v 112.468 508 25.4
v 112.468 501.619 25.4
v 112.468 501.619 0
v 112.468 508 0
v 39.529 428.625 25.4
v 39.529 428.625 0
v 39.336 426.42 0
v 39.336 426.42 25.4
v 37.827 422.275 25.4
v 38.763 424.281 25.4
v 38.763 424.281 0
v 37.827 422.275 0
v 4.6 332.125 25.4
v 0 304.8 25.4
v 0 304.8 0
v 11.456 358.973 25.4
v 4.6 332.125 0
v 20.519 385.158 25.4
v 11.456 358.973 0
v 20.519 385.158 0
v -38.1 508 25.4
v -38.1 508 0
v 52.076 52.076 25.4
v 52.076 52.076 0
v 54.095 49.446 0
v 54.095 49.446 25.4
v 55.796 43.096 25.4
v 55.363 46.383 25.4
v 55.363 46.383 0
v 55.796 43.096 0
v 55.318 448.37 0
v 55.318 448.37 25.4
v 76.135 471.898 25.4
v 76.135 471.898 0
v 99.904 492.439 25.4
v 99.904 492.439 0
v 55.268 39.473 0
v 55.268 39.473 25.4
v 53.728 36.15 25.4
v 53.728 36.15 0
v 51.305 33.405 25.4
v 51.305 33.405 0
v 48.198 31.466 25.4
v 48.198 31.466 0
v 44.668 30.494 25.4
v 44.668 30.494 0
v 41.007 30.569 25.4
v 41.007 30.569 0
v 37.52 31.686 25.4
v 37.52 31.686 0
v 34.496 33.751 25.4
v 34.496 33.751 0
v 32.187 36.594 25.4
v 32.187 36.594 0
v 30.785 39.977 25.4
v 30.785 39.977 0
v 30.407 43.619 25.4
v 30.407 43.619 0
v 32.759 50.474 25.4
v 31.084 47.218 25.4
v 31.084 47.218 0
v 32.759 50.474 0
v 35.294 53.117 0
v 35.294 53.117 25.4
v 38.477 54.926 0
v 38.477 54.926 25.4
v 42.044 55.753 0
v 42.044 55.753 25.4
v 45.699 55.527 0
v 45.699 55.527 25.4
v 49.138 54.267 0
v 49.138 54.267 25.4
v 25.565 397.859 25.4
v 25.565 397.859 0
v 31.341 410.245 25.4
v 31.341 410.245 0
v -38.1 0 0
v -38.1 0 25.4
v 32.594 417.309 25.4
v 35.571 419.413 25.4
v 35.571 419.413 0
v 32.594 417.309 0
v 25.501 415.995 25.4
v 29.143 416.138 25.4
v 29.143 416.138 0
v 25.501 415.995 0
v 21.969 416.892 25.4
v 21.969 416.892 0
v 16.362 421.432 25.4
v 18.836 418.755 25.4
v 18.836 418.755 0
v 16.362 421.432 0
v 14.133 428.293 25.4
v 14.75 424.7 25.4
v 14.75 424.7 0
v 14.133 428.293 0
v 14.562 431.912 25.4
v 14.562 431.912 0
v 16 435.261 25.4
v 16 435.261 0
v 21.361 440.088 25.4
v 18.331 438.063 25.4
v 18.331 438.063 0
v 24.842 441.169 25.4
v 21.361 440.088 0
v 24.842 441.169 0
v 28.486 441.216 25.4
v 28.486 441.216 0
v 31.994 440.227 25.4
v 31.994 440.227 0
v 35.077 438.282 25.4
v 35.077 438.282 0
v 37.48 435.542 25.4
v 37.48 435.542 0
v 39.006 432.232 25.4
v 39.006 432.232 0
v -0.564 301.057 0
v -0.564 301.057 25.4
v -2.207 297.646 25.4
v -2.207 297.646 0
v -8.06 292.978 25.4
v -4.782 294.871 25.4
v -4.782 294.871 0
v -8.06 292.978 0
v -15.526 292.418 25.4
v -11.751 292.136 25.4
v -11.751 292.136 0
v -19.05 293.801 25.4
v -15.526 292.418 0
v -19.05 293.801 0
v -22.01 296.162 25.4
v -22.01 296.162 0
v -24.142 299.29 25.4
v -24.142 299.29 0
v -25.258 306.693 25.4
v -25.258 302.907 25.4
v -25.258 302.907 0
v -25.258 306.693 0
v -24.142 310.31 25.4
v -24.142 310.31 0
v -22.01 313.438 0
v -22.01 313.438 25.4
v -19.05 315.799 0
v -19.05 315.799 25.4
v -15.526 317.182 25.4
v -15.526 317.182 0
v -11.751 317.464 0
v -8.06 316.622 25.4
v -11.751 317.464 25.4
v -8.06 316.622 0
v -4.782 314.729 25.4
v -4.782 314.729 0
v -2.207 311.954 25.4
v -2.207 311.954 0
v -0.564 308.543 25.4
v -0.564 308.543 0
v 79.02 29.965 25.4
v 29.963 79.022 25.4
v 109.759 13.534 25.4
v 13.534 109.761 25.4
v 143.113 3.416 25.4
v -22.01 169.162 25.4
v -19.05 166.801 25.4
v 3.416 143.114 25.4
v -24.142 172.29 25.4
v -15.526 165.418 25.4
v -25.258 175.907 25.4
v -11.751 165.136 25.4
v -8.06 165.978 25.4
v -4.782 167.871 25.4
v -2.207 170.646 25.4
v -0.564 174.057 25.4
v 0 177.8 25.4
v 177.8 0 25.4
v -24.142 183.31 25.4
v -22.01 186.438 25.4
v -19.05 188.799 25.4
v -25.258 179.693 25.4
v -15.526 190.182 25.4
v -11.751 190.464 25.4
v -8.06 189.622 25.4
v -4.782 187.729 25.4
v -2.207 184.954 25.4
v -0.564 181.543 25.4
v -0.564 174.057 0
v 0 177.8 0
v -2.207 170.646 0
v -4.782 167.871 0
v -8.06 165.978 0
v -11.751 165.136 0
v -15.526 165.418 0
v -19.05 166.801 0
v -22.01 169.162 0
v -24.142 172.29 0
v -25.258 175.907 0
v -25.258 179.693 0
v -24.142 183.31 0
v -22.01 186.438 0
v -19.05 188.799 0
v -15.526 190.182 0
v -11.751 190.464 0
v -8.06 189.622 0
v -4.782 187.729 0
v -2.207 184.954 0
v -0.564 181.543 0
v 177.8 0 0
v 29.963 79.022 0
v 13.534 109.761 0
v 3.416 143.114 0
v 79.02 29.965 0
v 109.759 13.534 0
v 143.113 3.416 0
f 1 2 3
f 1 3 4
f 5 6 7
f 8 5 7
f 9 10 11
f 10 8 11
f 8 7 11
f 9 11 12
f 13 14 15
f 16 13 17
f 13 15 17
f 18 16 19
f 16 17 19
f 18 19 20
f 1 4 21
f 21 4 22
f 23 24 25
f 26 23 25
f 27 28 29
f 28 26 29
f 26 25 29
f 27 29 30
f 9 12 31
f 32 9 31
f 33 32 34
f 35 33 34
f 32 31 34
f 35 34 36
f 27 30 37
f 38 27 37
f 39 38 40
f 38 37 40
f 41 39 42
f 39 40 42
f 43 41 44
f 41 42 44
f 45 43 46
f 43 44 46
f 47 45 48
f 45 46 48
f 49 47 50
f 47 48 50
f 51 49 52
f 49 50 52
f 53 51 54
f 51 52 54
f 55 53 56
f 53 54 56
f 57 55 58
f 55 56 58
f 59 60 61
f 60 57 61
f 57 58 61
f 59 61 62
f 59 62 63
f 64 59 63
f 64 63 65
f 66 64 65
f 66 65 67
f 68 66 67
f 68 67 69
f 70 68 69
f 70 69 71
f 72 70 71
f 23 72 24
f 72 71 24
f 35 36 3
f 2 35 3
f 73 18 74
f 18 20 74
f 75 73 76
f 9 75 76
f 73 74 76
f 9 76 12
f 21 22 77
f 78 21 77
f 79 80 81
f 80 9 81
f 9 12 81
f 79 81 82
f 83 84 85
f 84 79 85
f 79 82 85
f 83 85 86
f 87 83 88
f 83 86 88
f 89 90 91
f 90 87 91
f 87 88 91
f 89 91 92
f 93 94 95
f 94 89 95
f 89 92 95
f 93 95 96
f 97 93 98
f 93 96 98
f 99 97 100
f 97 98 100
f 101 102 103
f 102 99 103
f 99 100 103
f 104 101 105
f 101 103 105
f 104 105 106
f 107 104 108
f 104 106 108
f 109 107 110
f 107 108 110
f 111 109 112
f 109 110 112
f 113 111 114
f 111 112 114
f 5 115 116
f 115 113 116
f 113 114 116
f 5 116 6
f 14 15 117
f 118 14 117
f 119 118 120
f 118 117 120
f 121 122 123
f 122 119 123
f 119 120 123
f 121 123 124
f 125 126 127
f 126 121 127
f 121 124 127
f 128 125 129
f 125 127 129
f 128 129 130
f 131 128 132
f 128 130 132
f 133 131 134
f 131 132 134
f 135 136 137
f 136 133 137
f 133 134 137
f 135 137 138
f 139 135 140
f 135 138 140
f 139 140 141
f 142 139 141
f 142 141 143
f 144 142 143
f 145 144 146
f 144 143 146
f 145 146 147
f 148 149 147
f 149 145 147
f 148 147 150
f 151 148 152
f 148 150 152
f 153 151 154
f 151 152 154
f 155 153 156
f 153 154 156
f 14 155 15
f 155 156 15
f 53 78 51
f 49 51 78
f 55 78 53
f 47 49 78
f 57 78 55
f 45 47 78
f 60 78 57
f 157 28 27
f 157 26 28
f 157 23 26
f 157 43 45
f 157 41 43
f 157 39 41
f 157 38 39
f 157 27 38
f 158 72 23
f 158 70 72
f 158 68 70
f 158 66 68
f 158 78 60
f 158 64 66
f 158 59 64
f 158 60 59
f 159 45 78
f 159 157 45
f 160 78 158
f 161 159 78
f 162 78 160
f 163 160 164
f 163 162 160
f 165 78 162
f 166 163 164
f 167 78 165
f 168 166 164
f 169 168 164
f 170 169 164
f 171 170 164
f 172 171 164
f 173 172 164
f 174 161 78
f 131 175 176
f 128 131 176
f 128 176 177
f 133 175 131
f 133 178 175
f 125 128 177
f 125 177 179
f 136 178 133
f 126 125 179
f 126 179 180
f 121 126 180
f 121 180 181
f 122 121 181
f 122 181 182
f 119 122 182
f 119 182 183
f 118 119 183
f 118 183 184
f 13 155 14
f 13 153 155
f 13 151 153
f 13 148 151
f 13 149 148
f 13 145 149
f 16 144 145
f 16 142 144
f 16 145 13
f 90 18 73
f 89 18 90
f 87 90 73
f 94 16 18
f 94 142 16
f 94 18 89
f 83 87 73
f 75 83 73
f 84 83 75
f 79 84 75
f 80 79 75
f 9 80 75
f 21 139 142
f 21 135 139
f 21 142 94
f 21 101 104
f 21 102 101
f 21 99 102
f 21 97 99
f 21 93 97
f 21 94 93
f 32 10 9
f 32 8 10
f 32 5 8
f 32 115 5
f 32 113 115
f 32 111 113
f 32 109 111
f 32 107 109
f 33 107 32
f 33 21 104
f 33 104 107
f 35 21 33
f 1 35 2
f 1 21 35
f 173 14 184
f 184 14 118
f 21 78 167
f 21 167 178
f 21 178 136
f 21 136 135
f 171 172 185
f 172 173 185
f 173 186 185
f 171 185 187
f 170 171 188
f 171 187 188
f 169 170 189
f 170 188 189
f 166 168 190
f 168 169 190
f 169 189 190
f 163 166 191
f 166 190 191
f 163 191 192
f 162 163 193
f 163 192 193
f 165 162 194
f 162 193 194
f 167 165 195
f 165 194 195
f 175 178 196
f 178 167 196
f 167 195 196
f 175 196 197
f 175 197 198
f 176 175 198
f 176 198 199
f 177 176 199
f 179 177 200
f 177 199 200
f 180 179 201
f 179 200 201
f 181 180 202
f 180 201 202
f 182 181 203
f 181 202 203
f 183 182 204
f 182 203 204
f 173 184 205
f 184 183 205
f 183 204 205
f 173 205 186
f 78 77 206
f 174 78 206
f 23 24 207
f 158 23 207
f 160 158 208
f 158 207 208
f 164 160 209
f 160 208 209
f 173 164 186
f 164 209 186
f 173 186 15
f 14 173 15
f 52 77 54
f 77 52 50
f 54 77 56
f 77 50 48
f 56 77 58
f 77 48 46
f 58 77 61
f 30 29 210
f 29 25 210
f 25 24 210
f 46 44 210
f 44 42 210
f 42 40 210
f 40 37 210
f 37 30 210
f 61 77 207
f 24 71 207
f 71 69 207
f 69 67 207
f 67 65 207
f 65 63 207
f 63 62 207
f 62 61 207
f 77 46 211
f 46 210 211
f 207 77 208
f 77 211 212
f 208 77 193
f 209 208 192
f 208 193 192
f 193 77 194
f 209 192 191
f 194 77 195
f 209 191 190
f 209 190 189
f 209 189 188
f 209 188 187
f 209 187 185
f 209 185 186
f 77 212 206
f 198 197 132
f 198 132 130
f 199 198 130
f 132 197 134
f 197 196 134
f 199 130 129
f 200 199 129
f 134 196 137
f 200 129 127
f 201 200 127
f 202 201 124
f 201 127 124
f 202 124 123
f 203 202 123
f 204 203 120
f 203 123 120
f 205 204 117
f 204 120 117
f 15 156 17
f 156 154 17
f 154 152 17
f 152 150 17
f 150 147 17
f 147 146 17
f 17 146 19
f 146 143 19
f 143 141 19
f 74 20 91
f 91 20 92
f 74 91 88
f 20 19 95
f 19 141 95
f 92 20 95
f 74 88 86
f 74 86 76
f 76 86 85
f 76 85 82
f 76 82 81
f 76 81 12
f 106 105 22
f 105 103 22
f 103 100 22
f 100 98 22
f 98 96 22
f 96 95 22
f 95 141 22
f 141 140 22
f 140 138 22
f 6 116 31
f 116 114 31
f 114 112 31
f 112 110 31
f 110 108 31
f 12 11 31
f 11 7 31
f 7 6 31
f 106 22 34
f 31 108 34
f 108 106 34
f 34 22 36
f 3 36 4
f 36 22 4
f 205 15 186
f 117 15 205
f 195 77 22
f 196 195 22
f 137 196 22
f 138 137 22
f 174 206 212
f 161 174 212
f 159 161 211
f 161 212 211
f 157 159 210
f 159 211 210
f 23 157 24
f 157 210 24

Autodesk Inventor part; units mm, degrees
ref_plane "YZ Plane" through (0, 0, 0) normal (1, 0, 0) x (0, 1, 0)
ref_plane "XZ Plane" through (0, 0, 0) normal (0, 1, 0) x (-1, 0, 0)
ref_plane "XY Plane" through (0, 0, 0) normal (0, 0, 1) x (1, 0, 0)
sketch "Sketch1" plane through (0, 0, 0) normal (0, 0, 1) x (1, 0, 0)
  line L0 (0, 0) -> (609.6, 0) construction
  line L1 (609.6, 0) -> (609.6, 209.55)
  line L2 (609.6, 209.55) -> (0, 209.55) construction
  line L3 (0, 209.55) -> (0, 0) construction
  line L4 (0, 0) -> (304.8, 0) construction
  line L5 (304.8, 0) -> (304.8, 165.1) construction
  line L6 (304.8, 165.1) -> (0, 165.1) construction
  line L7 (0, 165.1) -> (0, 0) construction
  line L8 (0, 0) -> (165.1, 0) construction
  line L9 (165.1, 0) -> (165.1, 304.8) construction
  line L10 (165.1, 304.8) -> (0, 304.8) construction
  line L11 (0, 304.8) -> (0, 0) construction
  line L12 (0, 0) -> (177.8, 0) construction
  line L13 (177.8, 0) -> (177.8, 177.8) construction
  line L14 (177.8, 177.8) -> (0, 177.8) construction
  line L15 (0, 177.8) -> (0, 0) construction
  circle A0 centre (177.8, 177.8) radius 12.7
  line L16 (177.8, 177.8) -> (165.1, 177.8)
  line L17 (177.8, 177.8) -> (177.8, 165.1)
  line L18 (177.8, 177.8) -> (168.819744, 168.819744)
  line L19 (177.8, 177.8) -> (190.5, 177.8) construction
  line L20 (168.819744, 168.819744) -> (52.076414, 52.076414) construction
  line L21 (168.819744, 168.819744) -> (333.919744, 168.819744) construction
  line L22 (177.8, 165.1) -> (177.8, 0) construction
  line L23 (165.1, 177.8) -> (0, 177.8) construction
  arc A1 (0, 177.8) -> (177.8, 0) centre (177.8, 177.8) ccw
  line L24 (177.8, 177.8) -> (355.6, 177.8) construction
  line L25 (355.6, 177.8) -> (355.6, 193.675)
  line L26 (355.6, 193.675) -> (177.8, 193.675) construction
  line L27 (177.8, 193.675) -> (177.8, 177.8) construction
  circle A2 centre (355.6, 193.675) radius 12.7
  line L28 (355.6, 193.675) -> (482.6, 193.675) construction
  line L29 (482.6, 193.675) -> (482.6, 209.55) construction
  line L30 (482.6, 209.55) -> (355.6, 209.55) construction
  line L31 (355.6, 209.55) -> (355.6, 193.675) construction
  circle A3 centre (482.6, 209.55) radius 12.7
  line L32 (177.8, 0) -> (609.6, 0)
  line L33 (177.8, 165.1) -> (355.6, 180.975)
  line L34 (482.6, 196.85) -> (355.6, 180.975)
  line L35 (482.6, 196.85) -> (609.6, 209.55)
  line L36 (165.1, 177.8) -> (165.1, 304.8) construction
  line L37 (165.1, 304.8) -> (241.3, 304.8) construction
  circle A4 centre (241.3, 304.8) radius 76.2
  circle A5 centre (177.8, 228.6) radius 12.7
  line L38 (177.8, 177.8) -> (177.8, 228.6)
  line L39 (0, 177.8) -> (0, 304.8)
  line L40 (241.3, 304.8) -> (195.441695, 365.656026) construction
  line L41 (241.3, 304.8) -> (317.5, 304.8) construction
  line L42 (195.441695, 365.656026) -> (354.191695, 365.656026) construction
  line L43 (195.441695, 365.656026) -> (99.90356, 492.439413) construction
  line L44 (195.441695, 365.656026) -> (354.191695, 365.656026) construction
  line L45 (165.1, 304.8) -> (0, 304.8) construction
  line L46 (241.3, 304.8) -> (169.695422, 330.861935) construction
  line L47 (241.3, 304.8) -> (317.5, 304.8) construction
  line L48 (169.695422, 330.861935) -> (20.519219, 385.157633) construction
  line L49 (177.8, 0) -> (408.09644, 0) construction
  line L50 (241.3, 304.8) -> (317.5, 304.8) construction
  line L51 (241.3, 304.8) -> (175.308864, 342.9) construction
  line L52 (241.3, 304.8) -> (317.5, 304.8) construction
  line L53 (175.308864, 342.9) -> (37.827331, 422.275) construction
  arc A6 (99.90356, 492.439413) -> (20.519219, 385.157633) centre (241.3, 304.8) ccw
  arc A7 (37.827331, 422.275) -> (0, 304.8) centre (330.4977, 263.206429) ccw
  line L54 (37.827331, 422.275) -> (26.828809, 428.625) construction
  circle A8 centre (26.828809, 428.625) radius 12.7
  line L55 (0, 304.8) -> (-12.7, 304.8) construction
  circle A9 centre (-12.7, 304.8) radius 12.7
  line L56 (0, 177.8) -> (-12.7, 177.8) construction
  circle A10 centre (-12.7, 177.8) radius 12.7
  line L57 (52.076414, 52.076414) -> (43.096158, 43.096158) construction
  circle A11 centre (43.096158, 43.096158) radius 12.7
  line L58 (0, 177.8) -> (0, 304.8)
  circle A12 centre (43.096158, 43.096158) radius 11.1125
  circle A13 centre (-12.7, 304.8) radius 11.1125
  circle A14 centre (-12.7, 177.8) radius 11.1125
  circle A15 centre (26.828809, 428.625) radius 11.1125
  line L59 (190.5, 177.8) -> (393.7, 177.8) construction
  line L60 (609.6, 0) -> (-38.1, 0)
  line L61 (-38.1, 0) -> (-38.1, 508)
  line L62 (177.8, 0) -> (-38.1, 0)
  line L63 (-38.1, 508) -> (112.468391, 501.618568)
  line L64 (112.468391, 501.618568) -> (99.90356, 492.439413)
  line L65 (112.468391, 501.618568) -> (-38.1, 501.618568)
  line L66 (-38.1, 501.618568) -> (-38.1, 508)
  line L67 (-38.1, 508) -> (112.468391, 508)
  line L68 (112.468391, 508) -> (112.468391, 501.618568)
  point P0 (165.275068, 230.701449)
  point P1 (172.715134, 216.962383)
  dimension "d16" = 25.4
  dimension "d19" = 25.4
  dimension "d0" = 609.6
  dimension "d1" = 209.55
  dimension "d2" = 304.8
  dimension "d3" = 165.1
  dimension "d4" = 165.1
  dimension "d5" = 304.8
  dimension "d6" = 177.8
  dimension "d7" = 177.8
  dimension "d8" = 25.4
  dimension "d9" = 12.7
  dimension "d10" = 135
  dimension "d11" = 165.1
  dimension "d12" = 135
  dimension "d13" = 165.1
  dimension "d14" = 177.8
  dimension "d15" = 15.875
  dimension "d17" = 127
  dimension "d18" = 15.875
  dimension "d20" = 127
  dimension "d21" = 76.2
  dimension "d22" = 152.4
  dimension "d23" = 25.4
  dimension "d24" = 50.8
  dimension "d25" = 127
  dimension "d26" = 127
  dimension "d33" = 158.75
  dimension "d34" = 127
  dimension "d35" = 160
  dimension "d36" = 158.75
  dimension "d37" = 180
  dimension "d45" = 150
  dimension "d46" = 158.75
  dimension "d47" = 180
  dimension "d48" = 12.7
  dimension "d49" = 12.7
  dimension "d50" = 12.7
  dimension "d52" = 12.7
  dimension "d53" = 25.4
  dimension "d55" = 214.47119
  dimension "d56" = 22.225
  dimension "d57" = 22.225
  dimension "d58" = 22.225
  dimension "d59" = 22.225
  dimension "d60" = 134.70384
  dimension "d72" = 647.7
  dimension "d73" = 508
  dimension "d74" = 90
  dimension "d77" = 150.70356
  dimension "d78" = 15.56059
sketch "Sketch1 outline for Extrusion3" plane through (0, 0, 0) normal (0, 0, 1) x (1, 0, 0)
  line L0 (-38.1, 508) -> (-38.1, 0)
  line L1 (112.468391, 508) -> (-38.1, 508)
  line L2 (112.468391, 501.618568) -> (112.468391, 508)
  line L3 (99.90356, 492.439413) -> (112.468391, 501.618568)
  arc A0 (37.827331, 422.275) -> (99.90356, 492.439413) centre (241.3, 304.8) cw
  arc A1 (20.519219, 385.157633) -> (37.827331, 422.275) centre (241.3, 304.8) cw
  arc A2 (0, 304.8) -> (20.519219, 385.157633) centre (330.4977, 263.206429) cw
  line L4 (0, 177.8) -> (0, 304.8)
  arc A3 (52.076414, 52.076414) -> (0, 177.8) centre (177.8, 177.8) cw
  arc A4 (177.8, 0) -> (52.076414, 52.076414) centre (177.8, 177.8) cw
  line L5 (-38.1, 0) -> (177.8, 0)
  circle A5 centre (-12.7, 177.8) radius 12.7
  arc A6 (52.076414, 52.076414) -> (55.796158, 43.096158) centre (43.096158, 43.096158) ccw
  arc A7 (55.796158, 43.096158) -> (52.076414, 52.076414) centre (43.096158, 43.096158) ccw
  circle A8 centre (-12.7, 304.8) radius 12.7
  arc A9 (37.827331, 422.275) -> (39.528809, 428.625) centre (26.828809, 428.625) ccw
  arc A10 (39.528809, 428.625) -> (37.827331, 422.275) centre (26.828809, 428.625) ccw
extrude "Extrusion3" add sketch "Sketch1 outline for Extrusion3" along normal blind 25.4
